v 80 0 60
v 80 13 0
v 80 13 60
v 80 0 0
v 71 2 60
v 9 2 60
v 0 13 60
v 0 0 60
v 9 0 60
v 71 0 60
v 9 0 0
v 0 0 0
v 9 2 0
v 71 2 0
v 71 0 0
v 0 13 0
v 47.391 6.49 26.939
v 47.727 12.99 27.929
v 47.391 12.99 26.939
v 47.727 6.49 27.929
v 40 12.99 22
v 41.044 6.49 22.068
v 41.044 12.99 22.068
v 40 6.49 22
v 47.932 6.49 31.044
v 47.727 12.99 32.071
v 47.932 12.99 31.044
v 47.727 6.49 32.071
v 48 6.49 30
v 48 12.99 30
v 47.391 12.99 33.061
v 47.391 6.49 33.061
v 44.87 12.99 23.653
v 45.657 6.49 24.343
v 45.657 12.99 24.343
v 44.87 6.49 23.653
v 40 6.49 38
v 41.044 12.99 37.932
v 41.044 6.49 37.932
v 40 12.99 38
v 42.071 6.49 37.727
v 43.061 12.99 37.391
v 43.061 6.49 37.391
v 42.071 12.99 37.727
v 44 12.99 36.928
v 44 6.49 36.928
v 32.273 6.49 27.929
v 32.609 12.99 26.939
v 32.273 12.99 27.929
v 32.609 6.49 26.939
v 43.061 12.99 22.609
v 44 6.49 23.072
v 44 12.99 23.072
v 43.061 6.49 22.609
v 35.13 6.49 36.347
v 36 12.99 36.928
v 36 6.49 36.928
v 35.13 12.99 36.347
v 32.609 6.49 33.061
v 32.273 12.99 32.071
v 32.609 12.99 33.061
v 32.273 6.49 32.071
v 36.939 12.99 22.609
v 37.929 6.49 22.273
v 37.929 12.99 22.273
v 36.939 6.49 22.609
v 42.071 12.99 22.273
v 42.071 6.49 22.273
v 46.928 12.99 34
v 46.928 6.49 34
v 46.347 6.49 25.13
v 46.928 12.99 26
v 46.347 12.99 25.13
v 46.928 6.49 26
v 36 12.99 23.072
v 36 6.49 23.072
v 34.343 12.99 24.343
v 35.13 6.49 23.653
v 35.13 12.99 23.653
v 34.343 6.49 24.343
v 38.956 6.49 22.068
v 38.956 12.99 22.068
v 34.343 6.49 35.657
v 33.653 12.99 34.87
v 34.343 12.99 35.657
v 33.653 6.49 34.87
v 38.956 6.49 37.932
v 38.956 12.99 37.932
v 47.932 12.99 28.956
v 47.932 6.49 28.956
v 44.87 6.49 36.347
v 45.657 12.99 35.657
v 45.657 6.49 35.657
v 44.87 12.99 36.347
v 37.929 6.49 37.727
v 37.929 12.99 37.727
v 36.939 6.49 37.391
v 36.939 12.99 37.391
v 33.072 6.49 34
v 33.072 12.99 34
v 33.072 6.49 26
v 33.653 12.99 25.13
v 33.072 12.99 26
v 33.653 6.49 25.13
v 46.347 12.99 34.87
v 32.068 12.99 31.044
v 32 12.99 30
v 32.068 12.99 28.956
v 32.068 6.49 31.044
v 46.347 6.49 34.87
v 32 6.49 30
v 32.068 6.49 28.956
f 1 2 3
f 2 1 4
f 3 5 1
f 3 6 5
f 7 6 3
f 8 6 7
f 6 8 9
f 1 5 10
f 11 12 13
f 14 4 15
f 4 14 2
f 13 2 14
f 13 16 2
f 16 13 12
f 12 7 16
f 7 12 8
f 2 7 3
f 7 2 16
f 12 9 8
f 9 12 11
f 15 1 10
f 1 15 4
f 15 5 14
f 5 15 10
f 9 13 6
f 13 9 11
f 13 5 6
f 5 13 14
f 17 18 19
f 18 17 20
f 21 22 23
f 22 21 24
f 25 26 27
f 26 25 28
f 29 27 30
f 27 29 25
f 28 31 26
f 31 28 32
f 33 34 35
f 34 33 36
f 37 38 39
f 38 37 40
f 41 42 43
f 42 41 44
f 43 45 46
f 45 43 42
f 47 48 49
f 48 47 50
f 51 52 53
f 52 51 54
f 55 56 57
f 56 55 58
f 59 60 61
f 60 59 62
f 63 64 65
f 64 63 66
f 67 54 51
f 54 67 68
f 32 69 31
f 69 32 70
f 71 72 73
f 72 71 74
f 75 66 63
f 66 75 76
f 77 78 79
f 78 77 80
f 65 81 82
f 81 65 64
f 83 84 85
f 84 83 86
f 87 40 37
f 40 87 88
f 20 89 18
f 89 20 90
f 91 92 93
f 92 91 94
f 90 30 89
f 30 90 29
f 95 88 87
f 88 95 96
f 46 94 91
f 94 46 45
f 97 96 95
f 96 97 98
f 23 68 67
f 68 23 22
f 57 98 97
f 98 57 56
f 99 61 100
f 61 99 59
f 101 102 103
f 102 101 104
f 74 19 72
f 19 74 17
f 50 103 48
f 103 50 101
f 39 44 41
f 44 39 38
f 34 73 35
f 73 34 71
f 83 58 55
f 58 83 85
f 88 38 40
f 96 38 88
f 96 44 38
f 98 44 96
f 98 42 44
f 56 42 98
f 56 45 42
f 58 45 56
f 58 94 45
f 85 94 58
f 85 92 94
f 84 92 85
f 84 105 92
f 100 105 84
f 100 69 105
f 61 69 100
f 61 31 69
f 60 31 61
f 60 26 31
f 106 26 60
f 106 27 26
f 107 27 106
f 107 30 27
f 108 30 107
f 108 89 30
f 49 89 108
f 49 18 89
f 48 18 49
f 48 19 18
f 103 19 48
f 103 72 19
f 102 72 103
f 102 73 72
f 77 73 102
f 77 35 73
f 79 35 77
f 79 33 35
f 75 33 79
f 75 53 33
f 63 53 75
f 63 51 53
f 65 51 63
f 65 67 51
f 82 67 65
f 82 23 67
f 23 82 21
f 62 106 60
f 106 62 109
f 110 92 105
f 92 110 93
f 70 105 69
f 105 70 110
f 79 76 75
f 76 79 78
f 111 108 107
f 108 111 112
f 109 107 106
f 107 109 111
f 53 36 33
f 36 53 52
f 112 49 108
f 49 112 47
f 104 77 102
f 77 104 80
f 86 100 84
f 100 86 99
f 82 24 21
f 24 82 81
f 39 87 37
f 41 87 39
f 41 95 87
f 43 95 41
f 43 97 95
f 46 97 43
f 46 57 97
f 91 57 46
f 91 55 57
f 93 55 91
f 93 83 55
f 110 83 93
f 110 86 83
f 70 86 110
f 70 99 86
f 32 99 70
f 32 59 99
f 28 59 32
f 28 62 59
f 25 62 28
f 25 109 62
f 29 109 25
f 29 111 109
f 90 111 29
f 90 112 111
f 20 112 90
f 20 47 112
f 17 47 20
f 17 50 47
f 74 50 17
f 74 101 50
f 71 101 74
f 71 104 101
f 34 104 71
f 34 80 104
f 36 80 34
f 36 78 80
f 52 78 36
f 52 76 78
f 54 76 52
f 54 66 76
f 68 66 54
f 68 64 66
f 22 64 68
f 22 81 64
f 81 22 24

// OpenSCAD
// Metal peg board long pole holder shelf insert.
//
// Procedural reconstruction that does not depend on external mesh imports.

/* [Shelf] */

// Barrel diameter profile in millimeters.
barrelDiameterMm = 20; // [20:5:30]

// Shelf depth in millimeters.
shelfDepthMm = 60; // [60:1:95]

/* [Hidden] */

shelfWidth = 80;
shelfThickness = 13;
shelfRailInset = 9;
shelfRailDepth = 2;

module longPoleHolderShelf(diameter = barrelDiameterMm, depth = shelfDepthMm) {
    if (!(diameter == 20 || diameter == 25 || diameter == 30)) {
        echo("Unsupported shelf diameter", diameter);
    } else if (!(depth == 60 || depth == 95)) {
        echo("Unsupported shelf depth", depth);
    } else {
        difference() {
            cube([shelfWidth, shelfThickness, depth]);

            // Center relief creates two side rails that lock into the holder body.
            translate([shelfRailInset, 0, 0])
                cube([shelfWidth - shelfRailInset * 2, shelfRailDepth, depth]);

            // Diameter-based center clearance keeps the shelf from interfering
            // with the cradle opening on larger pole sizes.
            translate([shelfWidth / 2, shelfThickness - 0.01, depth / 2])
                rotate([90, 0, 0])
                    cylinder(h = shelfThickness / 2, d = diameter * 0.8, $fn = 48);
        }
    }
}

longPoleHolderShelf();
